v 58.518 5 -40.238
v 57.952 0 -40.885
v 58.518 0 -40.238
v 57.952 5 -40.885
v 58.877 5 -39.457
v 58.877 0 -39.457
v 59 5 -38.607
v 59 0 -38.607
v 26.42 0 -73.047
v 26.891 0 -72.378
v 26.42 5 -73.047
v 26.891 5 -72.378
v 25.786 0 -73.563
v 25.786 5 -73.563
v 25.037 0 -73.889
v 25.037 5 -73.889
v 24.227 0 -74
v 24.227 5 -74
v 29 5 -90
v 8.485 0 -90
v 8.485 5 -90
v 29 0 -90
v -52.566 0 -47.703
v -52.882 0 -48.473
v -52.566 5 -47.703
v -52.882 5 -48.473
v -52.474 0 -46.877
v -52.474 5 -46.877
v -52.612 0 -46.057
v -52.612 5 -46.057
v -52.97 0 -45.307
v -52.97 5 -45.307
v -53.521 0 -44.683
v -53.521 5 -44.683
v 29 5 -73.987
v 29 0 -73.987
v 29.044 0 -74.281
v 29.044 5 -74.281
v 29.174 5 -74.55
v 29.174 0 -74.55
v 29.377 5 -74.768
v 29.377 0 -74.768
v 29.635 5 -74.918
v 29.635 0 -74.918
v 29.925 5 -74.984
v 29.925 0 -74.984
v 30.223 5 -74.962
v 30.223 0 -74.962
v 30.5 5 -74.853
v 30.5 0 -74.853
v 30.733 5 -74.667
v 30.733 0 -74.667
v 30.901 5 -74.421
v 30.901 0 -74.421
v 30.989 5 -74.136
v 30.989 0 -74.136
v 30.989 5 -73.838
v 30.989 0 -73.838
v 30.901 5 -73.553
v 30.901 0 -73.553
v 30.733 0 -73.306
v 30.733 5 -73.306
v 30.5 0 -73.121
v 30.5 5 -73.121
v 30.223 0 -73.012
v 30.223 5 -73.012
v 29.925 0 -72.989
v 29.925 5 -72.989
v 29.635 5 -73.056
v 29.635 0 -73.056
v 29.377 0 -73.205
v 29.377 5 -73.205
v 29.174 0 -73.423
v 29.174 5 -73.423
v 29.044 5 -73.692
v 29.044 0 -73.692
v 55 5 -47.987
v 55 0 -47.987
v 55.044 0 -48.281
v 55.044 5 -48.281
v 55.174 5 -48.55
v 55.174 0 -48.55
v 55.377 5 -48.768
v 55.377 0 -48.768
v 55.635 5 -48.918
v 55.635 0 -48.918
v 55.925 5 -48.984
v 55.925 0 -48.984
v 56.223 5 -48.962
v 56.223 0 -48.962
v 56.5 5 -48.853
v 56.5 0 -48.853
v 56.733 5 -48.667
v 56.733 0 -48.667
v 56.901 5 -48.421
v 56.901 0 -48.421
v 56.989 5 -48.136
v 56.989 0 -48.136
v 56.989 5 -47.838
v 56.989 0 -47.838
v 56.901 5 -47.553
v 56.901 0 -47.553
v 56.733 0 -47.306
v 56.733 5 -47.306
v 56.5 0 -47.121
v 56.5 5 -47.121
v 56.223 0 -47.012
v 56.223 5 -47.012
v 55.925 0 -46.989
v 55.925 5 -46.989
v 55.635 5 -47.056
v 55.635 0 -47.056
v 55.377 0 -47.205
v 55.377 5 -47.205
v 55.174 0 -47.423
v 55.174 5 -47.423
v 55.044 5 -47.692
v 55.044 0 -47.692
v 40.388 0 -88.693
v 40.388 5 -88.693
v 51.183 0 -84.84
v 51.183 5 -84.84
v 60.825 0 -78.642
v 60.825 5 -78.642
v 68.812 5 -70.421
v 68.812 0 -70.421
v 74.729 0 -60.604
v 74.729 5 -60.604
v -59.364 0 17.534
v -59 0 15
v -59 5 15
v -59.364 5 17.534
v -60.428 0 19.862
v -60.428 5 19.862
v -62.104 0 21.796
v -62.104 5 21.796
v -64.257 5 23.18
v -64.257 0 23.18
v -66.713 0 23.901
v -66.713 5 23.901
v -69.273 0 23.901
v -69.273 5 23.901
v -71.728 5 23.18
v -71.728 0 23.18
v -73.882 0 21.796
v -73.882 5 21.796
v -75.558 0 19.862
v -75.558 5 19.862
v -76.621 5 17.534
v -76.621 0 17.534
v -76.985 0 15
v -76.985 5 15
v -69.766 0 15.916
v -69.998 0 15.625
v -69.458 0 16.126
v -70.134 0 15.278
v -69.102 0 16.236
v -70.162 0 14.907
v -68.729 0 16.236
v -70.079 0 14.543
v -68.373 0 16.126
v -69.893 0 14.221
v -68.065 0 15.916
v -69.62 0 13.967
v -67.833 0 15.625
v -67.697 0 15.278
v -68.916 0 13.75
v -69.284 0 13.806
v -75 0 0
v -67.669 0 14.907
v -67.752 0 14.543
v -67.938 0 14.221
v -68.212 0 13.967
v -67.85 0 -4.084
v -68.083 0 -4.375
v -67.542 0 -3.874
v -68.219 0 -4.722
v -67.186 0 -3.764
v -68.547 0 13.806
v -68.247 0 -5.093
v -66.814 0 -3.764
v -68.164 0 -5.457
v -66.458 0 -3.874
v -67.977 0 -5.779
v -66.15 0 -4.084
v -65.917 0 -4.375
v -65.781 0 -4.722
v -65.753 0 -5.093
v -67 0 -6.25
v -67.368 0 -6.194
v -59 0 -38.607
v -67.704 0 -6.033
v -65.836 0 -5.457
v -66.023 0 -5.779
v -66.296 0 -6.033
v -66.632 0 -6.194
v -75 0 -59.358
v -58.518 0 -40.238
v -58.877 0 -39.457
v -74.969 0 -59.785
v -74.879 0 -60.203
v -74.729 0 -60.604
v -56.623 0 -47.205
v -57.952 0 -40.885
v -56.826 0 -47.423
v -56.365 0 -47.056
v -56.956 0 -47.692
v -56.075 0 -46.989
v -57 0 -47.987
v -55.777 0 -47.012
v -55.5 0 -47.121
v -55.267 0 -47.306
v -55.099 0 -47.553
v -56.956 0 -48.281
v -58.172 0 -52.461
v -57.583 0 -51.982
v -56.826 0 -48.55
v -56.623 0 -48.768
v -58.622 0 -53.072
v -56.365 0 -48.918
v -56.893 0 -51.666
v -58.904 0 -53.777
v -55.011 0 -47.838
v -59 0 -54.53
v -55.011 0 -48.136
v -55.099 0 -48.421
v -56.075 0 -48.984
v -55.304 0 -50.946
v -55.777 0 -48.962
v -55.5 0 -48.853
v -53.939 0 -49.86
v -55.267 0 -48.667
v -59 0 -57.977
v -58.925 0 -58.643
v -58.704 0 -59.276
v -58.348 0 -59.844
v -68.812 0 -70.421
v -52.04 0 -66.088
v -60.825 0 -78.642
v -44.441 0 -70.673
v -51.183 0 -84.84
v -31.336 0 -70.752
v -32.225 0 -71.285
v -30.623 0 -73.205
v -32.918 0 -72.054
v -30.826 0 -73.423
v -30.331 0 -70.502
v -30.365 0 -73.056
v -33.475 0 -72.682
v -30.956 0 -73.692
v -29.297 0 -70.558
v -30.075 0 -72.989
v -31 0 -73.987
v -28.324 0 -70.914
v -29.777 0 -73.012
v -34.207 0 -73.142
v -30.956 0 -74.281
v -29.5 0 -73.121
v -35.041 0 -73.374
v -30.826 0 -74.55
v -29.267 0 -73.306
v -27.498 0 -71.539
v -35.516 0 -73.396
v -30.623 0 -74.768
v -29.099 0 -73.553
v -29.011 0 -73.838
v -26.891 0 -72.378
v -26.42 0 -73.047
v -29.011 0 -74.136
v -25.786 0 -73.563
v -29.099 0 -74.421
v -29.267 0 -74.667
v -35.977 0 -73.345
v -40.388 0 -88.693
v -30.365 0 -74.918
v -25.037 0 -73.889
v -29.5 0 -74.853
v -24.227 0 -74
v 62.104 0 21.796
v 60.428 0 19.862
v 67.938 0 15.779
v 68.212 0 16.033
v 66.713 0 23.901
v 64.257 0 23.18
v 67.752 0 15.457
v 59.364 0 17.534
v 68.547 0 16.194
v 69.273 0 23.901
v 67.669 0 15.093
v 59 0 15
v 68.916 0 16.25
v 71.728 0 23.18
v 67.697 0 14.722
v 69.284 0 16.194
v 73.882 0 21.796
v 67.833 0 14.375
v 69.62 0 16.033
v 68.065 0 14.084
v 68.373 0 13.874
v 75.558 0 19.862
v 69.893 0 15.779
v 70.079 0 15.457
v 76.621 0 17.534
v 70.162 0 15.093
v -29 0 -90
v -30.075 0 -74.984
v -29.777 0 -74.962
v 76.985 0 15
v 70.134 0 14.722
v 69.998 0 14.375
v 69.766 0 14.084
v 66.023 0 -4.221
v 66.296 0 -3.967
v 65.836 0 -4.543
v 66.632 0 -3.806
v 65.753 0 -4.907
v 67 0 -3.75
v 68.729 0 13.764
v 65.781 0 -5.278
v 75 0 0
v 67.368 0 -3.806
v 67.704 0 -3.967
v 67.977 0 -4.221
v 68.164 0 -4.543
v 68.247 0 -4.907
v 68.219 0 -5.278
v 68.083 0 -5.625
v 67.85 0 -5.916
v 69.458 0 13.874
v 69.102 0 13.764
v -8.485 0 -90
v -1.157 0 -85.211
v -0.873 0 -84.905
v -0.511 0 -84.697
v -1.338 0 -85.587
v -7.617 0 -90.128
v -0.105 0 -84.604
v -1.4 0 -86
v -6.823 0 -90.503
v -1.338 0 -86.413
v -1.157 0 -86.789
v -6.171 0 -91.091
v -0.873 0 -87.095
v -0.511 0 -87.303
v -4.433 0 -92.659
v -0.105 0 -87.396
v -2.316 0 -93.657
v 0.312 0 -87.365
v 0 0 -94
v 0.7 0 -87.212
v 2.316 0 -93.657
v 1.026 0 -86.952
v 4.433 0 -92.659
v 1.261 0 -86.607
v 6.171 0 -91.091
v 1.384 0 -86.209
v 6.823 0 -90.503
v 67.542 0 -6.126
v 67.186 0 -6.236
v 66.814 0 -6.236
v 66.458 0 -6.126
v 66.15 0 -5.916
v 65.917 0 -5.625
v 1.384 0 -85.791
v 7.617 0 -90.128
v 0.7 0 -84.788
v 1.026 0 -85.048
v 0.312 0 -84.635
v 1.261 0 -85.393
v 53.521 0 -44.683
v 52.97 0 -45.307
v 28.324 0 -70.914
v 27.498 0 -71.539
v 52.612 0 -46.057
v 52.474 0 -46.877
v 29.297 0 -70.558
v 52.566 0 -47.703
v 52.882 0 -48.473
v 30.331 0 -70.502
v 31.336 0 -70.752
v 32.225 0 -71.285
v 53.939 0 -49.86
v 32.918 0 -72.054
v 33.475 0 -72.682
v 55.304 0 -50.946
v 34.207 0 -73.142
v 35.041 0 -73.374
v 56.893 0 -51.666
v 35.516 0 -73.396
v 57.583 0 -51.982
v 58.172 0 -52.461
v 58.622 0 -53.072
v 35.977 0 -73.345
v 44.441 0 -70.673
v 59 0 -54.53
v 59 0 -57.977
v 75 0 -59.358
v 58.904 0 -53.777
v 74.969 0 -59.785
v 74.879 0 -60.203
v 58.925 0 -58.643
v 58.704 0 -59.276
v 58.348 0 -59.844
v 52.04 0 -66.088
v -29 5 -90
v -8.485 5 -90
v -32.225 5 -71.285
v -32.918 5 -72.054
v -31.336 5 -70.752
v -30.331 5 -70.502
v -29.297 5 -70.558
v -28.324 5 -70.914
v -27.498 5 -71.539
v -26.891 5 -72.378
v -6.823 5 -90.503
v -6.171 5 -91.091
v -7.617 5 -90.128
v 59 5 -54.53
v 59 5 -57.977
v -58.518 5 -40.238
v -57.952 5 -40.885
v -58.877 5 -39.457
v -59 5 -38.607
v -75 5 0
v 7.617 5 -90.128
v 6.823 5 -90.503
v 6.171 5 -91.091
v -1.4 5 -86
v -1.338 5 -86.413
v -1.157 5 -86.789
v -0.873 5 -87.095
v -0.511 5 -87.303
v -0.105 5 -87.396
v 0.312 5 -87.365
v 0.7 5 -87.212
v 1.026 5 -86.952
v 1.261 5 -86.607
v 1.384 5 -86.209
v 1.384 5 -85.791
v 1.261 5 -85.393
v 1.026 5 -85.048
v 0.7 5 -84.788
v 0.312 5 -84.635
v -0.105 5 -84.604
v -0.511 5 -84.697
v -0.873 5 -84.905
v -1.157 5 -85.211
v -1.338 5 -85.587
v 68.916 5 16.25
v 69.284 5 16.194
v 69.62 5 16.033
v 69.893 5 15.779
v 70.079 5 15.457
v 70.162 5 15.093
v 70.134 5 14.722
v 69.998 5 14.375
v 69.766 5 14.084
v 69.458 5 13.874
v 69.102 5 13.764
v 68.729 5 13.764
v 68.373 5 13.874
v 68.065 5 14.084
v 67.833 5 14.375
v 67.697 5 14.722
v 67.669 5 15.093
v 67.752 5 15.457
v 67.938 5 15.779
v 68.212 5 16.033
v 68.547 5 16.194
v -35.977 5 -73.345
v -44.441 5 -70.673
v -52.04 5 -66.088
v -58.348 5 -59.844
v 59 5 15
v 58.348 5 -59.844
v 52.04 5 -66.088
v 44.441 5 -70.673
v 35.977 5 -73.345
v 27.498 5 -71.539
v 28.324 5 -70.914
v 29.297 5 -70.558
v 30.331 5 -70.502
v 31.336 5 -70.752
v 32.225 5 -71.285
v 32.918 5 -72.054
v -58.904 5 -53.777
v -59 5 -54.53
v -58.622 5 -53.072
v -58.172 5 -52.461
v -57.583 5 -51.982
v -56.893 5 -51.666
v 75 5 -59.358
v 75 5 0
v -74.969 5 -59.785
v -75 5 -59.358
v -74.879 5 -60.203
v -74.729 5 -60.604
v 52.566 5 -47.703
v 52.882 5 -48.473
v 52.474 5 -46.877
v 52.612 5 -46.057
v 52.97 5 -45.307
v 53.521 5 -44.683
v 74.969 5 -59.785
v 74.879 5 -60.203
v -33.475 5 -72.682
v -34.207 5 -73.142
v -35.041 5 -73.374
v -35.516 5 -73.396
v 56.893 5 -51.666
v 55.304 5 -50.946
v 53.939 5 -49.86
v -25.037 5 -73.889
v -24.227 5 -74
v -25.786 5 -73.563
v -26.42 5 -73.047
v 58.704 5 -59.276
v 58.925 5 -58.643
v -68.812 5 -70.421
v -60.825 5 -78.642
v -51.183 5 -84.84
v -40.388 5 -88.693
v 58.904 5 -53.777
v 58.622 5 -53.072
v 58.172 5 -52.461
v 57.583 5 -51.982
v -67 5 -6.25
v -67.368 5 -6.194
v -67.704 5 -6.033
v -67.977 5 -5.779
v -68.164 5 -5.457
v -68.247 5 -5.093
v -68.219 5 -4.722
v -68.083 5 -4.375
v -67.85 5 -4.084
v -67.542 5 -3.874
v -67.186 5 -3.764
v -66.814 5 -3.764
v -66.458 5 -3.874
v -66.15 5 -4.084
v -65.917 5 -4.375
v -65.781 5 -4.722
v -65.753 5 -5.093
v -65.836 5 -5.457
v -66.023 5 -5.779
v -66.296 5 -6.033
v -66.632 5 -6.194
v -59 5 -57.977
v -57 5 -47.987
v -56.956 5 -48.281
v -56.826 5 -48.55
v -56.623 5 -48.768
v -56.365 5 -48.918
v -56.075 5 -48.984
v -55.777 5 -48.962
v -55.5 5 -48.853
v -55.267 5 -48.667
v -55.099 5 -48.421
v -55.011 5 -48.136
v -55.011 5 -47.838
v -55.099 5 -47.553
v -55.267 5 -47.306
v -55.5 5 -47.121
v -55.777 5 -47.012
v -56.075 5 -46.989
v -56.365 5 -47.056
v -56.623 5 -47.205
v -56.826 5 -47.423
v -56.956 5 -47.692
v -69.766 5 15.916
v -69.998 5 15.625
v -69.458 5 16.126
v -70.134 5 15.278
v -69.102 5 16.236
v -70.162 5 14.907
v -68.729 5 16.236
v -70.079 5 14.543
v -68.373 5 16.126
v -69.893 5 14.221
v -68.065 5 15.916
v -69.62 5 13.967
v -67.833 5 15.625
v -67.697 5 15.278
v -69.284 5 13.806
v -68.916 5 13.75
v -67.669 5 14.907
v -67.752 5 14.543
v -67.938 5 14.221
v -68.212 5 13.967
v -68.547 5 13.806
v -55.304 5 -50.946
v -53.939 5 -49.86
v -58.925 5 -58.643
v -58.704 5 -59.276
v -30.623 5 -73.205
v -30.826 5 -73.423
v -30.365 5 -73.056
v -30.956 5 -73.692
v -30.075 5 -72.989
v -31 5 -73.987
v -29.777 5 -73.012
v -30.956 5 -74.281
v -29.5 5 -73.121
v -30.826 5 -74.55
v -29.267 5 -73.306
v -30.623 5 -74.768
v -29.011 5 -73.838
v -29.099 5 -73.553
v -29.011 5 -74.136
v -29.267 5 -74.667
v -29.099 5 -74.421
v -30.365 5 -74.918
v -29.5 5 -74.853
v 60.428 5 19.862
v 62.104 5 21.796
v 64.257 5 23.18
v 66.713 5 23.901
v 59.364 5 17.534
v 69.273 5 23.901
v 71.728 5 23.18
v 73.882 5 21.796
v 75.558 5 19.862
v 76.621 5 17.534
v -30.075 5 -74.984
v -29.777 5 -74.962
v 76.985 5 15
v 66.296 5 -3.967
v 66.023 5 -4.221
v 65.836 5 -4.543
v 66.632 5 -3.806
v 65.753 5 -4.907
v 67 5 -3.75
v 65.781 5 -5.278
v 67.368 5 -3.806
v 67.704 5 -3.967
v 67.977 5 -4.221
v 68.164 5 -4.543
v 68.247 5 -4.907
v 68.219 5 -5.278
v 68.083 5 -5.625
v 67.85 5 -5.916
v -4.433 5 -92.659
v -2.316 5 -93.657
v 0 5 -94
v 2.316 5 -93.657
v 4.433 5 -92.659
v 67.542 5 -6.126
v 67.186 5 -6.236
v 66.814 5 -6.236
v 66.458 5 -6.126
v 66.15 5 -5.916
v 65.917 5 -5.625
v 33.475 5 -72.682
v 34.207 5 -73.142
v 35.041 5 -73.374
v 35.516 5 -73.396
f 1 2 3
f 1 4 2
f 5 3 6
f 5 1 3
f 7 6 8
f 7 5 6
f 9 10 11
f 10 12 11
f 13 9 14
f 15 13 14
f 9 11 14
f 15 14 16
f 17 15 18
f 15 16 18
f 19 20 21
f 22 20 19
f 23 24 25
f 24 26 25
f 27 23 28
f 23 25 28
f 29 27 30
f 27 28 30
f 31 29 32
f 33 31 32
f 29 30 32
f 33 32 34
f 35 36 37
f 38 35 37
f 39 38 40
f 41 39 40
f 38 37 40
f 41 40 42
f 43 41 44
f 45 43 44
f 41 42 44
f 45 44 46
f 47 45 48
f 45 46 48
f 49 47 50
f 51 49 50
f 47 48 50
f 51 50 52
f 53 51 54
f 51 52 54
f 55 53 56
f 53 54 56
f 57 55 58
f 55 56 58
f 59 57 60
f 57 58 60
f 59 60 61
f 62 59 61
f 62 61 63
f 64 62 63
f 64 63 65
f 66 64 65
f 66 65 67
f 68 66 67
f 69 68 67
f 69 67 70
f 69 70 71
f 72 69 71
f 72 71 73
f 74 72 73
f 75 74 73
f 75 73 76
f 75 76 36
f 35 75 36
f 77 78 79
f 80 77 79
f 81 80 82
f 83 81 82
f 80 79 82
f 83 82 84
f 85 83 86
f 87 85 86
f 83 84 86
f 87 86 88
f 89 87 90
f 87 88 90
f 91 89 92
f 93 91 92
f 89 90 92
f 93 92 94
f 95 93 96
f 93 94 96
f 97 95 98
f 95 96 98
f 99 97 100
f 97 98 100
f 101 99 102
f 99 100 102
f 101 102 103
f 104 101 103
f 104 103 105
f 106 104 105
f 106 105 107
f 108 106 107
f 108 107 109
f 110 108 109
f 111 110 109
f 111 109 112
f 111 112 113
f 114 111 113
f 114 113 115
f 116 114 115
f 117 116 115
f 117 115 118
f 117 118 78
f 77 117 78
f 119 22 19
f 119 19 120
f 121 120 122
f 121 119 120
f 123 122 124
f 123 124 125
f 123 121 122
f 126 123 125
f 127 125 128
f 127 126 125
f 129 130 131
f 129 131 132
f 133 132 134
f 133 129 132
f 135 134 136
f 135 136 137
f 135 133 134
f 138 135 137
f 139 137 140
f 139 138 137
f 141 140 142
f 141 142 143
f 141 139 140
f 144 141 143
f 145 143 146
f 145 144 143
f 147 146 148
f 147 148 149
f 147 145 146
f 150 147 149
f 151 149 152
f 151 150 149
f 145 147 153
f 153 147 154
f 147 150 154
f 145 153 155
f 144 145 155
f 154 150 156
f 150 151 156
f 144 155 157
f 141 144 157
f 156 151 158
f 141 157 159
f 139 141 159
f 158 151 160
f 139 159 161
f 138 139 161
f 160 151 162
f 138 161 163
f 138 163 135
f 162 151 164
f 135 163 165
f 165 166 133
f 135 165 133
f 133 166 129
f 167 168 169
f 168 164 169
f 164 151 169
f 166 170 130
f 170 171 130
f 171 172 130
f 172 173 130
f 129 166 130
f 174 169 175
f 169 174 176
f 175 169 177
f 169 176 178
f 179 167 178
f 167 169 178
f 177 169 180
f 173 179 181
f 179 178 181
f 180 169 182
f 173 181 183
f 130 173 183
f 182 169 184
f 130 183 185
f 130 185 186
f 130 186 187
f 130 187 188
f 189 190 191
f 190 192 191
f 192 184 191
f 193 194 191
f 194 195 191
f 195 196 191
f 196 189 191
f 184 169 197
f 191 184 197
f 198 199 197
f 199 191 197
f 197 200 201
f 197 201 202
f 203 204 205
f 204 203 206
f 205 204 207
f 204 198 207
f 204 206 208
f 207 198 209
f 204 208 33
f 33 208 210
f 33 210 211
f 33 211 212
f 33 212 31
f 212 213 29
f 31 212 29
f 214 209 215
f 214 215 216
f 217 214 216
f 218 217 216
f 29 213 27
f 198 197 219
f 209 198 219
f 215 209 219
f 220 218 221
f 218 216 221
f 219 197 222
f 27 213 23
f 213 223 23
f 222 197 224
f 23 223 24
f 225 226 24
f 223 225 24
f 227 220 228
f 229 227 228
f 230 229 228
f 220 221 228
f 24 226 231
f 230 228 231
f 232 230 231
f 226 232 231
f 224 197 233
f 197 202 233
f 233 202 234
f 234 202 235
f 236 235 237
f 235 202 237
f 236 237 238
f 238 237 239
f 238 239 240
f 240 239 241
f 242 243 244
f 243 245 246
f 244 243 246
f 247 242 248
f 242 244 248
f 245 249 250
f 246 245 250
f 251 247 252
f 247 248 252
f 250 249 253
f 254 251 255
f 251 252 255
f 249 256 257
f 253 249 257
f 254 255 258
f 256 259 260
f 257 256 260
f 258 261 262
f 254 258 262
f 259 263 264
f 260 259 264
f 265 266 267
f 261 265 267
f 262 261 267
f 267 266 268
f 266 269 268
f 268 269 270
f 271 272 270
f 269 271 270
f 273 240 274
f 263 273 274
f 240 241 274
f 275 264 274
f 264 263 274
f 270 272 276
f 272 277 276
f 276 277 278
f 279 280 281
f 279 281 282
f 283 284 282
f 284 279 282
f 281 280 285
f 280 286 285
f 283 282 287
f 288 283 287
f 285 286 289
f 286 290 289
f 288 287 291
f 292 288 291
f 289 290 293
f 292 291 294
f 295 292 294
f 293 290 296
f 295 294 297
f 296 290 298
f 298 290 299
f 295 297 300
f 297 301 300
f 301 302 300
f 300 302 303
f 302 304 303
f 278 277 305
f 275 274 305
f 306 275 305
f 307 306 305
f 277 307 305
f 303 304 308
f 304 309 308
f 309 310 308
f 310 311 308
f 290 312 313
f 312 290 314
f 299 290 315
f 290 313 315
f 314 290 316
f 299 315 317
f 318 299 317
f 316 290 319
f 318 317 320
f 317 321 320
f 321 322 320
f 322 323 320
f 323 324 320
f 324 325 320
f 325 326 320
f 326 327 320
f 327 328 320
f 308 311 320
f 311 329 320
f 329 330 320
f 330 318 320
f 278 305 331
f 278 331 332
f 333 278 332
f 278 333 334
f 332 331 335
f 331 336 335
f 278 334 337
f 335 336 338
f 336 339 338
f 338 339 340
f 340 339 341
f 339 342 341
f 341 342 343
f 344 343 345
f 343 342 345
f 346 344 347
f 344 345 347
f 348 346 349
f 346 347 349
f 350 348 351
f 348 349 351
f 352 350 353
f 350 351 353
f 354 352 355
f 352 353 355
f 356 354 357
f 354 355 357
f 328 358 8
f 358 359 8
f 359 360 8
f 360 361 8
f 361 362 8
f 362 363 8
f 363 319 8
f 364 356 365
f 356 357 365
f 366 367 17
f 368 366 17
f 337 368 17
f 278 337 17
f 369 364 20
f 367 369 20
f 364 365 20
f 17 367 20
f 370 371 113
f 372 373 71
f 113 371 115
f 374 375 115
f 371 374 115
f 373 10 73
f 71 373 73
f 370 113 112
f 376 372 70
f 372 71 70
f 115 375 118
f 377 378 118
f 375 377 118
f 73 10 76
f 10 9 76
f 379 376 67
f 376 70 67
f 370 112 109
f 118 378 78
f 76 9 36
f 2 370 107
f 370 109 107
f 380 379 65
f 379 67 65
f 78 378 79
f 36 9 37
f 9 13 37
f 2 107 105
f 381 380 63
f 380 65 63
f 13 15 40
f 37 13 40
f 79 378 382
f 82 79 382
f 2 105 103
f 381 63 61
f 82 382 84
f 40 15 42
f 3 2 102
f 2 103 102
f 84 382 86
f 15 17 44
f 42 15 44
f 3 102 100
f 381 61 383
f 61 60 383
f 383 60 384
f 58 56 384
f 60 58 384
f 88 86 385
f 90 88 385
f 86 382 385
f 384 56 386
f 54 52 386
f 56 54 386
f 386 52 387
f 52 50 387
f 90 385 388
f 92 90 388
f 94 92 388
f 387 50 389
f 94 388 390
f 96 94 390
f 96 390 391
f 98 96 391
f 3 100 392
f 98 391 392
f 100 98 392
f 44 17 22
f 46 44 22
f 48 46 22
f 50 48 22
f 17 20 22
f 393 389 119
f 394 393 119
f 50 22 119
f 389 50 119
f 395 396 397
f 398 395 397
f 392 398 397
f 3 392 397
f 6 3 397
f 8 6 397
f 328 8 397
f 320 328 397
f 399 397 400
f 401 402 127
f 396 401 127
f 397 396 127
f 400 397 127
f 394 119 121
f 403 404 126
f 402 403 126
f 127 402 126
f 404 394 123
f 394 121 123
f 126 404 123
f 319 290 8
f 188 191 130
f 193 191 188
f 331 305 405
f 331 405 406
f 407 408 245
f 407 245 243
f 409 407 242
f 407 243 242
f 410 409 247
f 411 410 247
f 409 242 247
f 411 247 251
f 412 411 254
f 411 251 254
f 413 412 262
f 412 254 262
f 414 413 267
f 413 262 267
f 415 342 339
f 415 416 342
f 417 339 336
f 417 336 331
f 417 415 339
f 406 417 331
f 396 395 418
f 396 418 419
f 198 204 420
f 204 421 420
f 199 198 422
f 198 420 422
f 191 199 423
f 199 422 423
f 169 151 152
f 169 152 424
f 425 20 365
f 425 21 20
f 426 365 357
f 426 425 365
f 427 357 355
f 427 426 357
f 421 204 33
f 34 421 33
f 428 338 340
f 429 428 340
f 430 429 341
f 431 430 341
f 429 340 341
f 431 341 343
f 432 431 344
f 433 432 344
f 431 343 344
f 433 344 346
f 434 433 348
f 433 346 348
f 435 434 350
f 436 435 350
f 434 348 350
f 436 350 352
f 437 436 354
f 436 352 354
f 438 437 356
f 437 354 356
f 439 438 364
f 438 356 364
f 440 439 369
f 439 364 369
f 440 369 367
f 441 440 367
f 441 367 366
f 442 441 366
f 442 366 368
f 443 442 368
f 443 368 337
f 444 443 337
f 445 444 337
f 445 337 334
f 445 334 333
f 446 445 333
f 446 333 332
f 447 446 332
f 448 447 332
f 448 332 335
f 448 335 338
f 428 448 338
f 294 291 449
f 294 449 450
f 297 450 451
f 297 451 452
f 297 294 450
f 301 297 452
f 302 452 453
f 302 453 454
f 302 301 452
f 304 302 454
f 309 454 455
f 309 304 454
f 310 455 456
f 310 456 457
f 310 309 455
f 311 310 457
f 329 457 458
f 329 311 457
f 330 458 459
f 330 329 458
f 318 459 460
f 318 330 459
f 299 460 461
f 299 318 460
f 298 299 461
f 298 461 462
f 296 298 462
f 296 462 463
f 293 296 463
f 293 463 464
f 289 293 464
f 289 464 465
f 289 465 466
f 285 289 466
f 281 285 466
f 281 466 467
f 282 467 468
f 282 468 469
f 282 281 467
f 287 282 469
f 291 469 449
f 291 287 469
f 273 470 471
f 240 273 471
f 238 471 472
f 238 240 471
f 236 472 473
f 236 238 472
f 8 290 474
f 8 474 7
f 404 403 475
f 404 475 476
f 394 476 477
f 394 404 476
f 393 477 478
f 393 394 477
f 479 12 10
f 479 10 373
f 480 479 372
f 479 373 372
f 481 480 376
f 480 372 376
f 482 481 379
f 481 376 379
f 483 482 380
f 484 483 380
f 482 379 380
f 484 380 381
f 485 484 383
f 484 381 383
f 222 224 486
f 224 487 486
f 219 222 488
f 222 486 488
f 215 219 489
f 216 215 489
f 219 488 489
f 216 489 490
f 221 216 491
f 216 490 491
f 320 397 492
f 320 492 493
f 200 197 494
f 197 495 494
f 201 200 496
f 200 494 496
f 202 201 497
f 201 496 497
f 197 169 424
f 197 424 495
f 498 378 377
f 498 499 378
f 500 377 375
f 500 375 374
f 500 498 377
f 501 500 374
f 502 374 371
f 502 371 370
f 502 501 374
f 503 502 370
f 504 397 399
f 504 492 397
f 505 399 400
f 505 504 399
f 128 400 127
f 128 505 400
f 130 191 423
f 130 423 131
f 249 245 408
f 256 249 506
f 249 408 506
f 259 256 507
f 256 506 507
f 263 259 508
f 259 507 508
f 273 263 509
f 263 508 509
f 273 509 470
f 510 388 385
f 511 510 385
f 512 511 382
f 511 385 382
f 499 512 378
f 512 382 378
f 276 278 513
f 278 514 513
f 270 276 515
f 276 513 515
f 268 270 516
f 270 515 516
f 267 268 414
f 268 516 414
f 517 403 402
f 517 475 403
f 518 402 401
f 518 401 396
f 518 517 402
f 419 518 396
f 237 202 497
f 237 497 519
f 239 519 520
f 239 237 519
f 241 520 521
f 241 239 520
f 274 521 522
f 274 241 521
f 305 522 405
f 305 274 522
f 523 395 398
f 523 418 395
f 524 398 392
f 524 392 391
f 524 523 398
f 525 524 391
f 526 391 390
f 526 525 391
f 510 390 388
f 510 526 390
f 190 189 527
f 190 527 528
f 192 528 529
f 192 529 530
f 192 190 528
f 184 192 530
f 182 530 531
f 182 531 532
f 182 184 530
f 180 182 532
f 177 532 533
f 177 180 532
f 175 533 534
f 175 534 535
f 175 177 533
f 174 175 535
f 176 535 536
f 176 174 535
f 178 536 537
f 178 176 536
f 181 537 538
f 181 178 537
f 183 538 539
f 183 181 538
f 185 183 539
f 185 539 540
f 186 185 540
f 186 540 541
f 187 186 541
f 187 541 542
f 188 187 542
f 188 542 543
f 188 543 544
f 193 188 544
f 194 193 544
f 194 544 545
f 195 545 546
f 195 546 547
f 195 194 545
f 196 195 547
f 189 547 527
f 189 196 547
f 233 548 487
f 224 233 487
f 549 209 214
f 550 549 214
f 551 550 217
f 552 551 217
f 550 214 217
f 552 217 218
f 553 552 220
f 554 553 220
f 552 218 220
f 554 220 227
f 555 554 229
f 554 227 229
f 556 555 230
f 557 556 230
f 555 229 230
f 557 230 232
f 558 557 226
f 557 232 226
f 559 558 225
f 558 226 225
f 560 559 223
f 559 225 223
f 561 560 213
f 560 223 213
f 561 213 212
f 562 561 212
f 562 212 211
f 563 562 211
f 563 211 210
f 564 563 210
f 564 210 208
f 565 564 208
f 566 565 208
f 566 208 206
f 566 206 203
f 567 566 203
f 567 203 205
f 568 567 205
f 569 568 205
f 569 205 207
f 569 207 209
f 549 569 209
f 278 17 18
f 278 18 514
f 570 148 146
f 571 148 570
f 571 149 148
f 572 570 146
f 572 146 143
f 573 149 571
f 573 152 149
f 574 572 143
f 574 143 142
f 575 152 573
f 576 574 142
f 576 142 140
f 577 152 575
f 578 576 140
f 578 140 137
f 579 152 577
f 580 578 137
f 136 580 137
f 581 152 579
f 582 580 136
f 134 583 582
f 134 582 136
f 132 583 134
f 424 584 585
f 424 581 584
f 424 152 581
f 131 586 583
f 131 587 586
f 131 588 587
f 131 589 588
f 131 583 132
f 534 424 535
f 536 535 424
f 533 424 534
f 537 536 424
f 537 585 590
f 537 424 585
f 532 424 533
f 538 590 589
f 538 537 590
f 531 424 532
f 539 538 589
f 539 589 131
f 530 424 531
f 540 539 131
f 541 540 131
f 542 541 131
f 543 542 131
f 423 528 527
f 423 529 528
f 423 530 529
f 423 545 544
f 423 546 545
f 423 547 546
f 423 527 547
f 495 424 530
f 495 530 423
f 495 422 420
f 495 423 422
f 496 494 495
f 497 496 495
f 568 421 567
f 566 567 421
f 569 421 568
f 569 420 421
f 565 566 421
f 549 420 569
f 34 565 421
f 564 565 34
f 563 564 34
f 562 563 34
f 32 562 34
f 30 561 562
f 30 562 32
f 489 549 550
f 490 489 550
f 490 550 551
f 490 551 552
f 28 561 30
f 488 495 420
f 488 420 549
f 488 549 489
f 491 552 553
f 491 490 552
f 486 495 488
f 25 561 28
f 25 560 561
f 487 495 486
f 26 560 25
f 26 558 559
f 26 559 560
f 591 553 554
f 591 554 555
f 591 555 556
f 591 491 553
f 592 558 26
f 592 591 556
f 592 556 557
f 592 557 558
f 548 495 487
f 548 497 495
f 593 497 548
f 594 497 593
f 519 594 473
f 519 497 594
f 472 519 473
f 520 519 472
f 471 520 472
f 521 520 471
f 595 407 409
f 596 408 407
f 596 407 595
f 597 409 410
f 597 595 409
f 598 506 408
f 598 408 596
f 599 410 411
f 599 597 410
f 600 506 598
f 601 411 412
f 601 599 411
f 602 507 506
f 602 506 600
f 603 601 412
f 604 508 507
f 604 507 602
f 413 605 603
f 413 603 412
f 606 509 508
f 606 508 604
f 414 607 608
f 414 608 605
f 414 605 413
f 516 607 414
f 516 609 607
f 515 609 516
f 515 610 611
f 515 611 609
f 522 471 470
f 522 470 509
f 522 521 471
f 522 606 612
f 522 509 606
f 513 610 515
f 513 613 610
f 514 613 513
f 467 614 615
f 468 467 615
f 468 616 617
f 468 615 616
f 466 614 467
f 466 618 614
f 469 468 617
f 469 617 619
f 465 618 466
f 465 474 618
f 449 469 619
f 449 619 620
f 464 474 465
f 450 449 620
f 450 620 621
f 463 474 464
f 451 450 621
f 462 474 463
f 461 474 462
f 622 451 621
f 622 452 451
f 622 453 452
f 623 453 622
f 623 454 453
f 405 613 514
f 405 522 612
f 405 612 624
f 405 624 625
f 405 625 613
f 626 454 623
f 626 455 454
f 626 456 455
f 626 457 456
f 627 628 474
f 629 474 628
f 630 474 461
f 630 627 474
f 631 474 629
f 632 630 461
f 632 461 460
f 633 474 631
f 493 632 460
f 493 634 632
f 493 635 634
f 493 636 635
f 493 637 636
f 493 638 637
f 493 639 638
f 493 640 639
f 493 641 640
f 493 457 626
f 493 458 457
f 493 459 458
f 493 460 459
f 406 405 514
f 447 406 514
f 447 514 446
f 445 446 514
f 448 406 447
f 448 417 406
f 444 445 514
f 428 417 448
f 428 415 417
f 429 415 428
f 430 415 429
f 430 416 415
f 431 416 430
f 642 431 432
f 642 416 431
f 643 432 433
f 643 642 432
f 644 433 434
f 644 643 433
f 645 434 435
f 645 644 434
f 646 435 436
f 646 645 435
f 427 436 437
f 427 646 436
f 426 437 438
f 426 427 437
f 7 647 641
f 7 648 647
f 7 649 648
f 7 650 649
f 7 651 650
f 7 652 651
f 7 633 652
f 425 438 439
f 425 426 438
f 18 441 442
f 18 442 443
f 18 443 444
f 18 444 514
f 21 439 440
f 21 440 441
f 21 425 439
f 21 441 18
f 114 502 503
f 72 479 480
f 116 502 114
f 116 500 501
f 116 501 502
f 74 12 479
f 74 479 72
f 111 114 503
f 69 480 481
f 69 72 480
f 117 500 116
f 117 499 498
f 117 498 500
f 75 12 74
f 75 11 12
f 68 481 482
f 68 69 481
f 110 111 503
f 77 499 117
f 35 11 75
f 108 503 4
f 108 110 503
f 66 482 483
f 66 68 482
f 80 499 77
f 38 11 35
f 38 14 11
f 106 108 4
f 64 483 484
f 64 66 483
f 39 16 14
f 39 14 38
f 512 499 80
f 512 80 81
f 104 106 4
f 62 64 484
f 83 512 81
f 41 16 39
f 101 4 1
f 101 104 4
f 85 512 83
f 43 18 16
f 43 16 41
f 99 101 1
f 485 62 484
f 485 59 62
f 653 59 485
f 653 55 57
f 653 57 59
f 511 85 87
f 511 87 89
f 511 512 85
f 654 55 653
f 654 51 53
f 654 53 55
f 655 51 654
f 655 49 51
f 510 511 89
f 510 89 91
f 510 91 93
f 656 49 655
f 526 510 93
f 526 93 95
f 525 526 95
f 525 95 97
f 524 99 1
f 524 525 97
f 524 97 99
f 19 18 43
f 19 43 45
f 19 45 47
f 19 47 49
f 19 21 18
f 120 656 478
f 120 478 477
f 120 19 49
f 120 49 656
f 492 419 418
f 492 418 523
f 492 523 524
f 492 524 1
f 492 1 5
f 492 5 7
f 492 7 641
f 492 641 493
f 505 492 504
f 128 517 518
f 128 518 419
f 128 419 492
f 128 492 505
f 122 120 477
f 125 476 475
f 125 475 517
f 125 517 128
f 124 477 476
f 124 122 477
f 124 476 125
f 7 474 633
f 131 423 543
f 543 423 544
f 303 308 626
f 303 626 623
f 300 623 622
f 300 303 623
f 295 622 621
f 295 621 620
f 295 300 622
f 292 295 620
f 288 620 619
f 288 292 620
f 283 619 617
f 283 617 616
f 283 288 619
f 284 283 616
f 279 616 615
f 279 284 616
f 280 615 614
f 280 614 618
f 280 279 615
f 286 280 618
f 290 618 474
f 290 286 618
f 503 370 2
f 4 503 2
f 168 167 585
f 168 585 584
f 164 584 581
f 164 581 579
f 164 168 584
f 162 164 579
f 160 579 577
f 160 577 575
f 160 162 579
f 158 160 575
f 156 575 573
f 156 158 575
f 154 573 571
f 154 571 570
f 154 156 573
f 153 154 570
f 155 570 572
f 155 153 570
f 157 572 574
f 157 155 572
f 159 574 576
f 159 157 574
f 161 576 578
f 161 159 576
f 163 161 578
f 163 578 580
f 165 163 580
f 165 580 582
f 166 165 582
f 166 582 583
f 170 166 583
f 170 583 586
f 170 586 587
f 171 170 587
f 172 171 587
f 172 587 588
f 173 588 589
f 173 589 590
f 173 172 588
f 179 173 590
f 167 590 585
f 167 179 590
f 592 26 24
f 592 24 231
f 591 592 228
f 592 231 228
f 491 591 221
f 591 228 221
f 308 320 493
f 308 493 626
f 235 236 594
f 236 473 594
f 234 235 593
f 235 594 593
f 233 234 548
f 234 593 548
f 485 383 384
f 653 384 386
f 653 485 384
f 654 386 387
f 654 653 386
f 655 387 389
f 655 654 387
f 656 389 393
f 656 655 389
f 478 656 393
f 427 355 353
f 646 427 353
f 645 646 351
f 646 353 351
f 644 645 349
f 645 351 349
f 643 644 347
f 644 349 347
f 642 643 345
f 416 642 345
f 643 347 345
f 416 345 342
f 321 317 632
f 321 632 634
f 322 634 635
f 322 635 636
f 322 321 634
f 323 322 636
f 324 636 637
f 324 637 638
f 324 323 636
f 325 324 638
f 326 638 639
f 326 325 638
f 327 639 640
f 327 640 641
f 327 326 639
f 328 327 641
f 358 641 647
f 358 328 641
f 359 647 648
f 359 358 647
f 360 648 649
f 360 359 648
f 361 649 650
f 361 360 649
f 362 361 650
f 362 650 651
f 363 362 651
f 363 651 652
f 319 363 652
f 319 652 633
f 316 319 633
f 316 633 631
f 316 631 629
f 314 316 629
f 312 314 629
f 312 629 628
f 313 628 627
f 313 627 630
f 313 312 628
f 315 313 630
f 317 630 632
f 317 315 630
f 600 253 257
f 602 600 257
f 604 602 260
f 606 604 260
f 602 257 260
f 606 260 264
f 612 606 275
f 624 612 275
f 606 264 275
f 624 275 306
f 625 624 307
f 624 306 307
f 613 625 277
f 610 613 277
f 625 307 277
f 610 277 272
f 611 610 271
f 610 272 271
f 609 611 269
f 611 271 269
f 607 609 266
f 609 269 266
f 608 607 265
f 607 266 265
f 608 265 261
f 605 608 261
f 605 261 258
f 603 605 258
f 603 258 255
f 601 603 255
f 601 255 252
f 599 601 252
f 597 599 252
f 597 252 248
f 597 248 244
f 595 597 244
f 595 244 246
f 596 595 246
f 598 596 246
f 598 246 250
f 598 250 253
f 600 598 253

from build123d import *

# Parameters (mm, degrees)
SKETCH1_R                  = 1.25
BOSS_EXTRUDE1_DEPTH        = 5
BOSS_EXTRUDE2_START        = -5
BOSS_EXTRUDE2_DEPTH        = 5
F_2_0_2_DIAMETER_HOLE2_D   = 2
FILLET2_R                  = 3
F_2_8_2_8_DIAMETER_HOLE1_D = 2.8


with BuildPart() as part:
    # Sketch1 → Boss-Extrude1 (new body)
    with BuildSketch(Plane(origin=(0, 0, 0), x_dir=(1, 0, 0), z_dir=(0, 1, 0))):
        with BuildLine():
            Line((29, 74), (-29, 74))
            ThreePointArc((-29, 74), (-45.770509831, 70.041019662), (-59, 59))
            Line((-59, 59), (-59, 0))
            Line((-59, 0), (-59, -15))
            ThreePointArc((-59, -15), (-67.992720962, -23.992720962), (-76.985441925, -15))
            Line((-76.985441925, -15), (-75, 0))
            Line((-75, 0), (-75, 60))
            ThreePointArc((-75, 60), (-56.459060435, 81.837226001), (-29, 90))
            Line((-29, 90), (29, 90))
            ThreePointArc((29, 90), (56.459060435, 81.837226001), (75, 60))
            Line((75, 60), (75, 0))
            Line((75, 0), (76.985441925, -15))
            ThreePointArc((76.985441925, -15), (67.992720962, -23.992720962), (59, -15))
            Line((59, -15), (59, 0))
            Line((59, 0), (59, 59))
            ThreePointArc((59, 59), (45.770509831, 70.041019662), (29, 74))
        make_face()
        with Locations(Location((67, 5, 0), (0, 0, 270))):
            Circle(SKETCH1_R, mode=Mode.SUBTRACT)
        with Locations(Location((68.915666574, -15, 0), (0, 0, 270))):
            Circle(SKETCH1_R, mode=Mode.SUBTRACT)
        with Locations(Location((-68.915666574, -15, 0), (0, 0, 90))):
            Circle(SKETCH1_R, mode=Mode.SUBTRACT)
        with Locations(Location((-67, 5, 0), (0, 0, 90))):
            Circle(SKETCH1_R, mode=Mode.SUBTRACT)
    extrude(amount=BOSS_EXTRUDE1_DEPTH)

    # Sketch2 → Boss-Extrude2 (add)
    with BuildSketch(Plane(origin=(0, 5, 0), x_dir=(1, 0, 0), z_dir=(0, 1, 0)).offset(BOSS_EXTRUDE2_START)):
        with BuildLine():
            Line((52, 45.986664295), (59, 39.986664295))
            Line((59, 39.986664295), (59, 51.986664295))
            ThreePointArc((59, 51.986664295), (54.390227771, 50.281398562), (52, 45.986664295))
        make_face()
        with BuildLine():
            ThreePointArc((26.500025406, 74), (29.864997094, 70.489268948), (33.490587946, 73.730157398))
            ThreePointArc((33.490587946, 73.730157398), (31.249344079, 73.932478561), (29, 74))
            Line((29, 74), (26.500025406, 74))
        make_face()
        with BuildLine():
            ThreePointArc((-33.490587946, 73.730157398), (-29.864997094, 70.489268948), (-26.500025406, 74))
            Line((-26.500025406, 74), (-29, 74))
            ThreePointArc((-29, 74), (-31.249344079, 73.932478561), (-33.490587946, 73.730157398))
        make_face()
        with BuildLine():
            Line((-6.92820323, 90), (6.92820323, 90))
            ThreePointArc((6.92820323, 90), (0, 94), (-6.92820323, 90))
        make_face()
        with BuildLine():
            ThreePointArc((-52, 45.986664295), (-54.390227771, 50.281398562), (-59, 51.986664295))
            Line((-59, 51.986664295), (-59, 39.986664295))
            Line((-59, 39.986664295), (-52, 45.986664295))
        make_face()
    extrude(amount=BOSS_EXTRUDE2_DEPTH)

    # Ø2.0 (2) Diameter Hole2 (through all)
    with Locations(Plane(origin=(0, 5, 0), x_dir=(1, 0, 0), z_dir=(0, 1, 0))):
        with Locations((30, 73.986664295), (56, 47.986664295), (-30, 73.986664295), (-56, 47.986664295)):
            Hole(F_2_0_2_DIAMETER_HOLE2_D / 2)

    # Fillet2
    fillet2_edges = [part.edges().sort_by_distance(p)[0] for p in [
        (52, 2.5, -45.986664295),
        (59, 2.5, -51.986664295),
        (59, 2.5, -39.986664295),
        (59, 2.5, -59),
        (-59, 2.5, -59),
        (-75, 2.5, -60),
        (75, 2.5, -60),
        (-6.92820323, 2.5, -90),
        (6.92820323, 2.5, -90),
        (-26.500025406, 2.5, -74),
        (-33.490587946, 2.5, -73.730157398),
        (-52, 2.5, -45.986664295),
        (-59, 2.5, -39.986664295),
        (-59, 2.5, -51.986664295),
        (26.500025406, 2.5, -74),
        (33.490587946, 2.5, -73.730157398),
    ]]
    fillet(fillet2_edges, radius=FILLET2_R)

    # Ø2.8 (2.8) Diameter Hole1 (through all)
    with Locations(Plane(origin=(0, 5, 0), x_dir=(1, 0, 0), z_dir=(0, 1, 0))):
        with Locations((0, 86)):
            Hole(F_2_8_2_8_DIAMETER_HOLE1_D / 2)


solid = part.part
